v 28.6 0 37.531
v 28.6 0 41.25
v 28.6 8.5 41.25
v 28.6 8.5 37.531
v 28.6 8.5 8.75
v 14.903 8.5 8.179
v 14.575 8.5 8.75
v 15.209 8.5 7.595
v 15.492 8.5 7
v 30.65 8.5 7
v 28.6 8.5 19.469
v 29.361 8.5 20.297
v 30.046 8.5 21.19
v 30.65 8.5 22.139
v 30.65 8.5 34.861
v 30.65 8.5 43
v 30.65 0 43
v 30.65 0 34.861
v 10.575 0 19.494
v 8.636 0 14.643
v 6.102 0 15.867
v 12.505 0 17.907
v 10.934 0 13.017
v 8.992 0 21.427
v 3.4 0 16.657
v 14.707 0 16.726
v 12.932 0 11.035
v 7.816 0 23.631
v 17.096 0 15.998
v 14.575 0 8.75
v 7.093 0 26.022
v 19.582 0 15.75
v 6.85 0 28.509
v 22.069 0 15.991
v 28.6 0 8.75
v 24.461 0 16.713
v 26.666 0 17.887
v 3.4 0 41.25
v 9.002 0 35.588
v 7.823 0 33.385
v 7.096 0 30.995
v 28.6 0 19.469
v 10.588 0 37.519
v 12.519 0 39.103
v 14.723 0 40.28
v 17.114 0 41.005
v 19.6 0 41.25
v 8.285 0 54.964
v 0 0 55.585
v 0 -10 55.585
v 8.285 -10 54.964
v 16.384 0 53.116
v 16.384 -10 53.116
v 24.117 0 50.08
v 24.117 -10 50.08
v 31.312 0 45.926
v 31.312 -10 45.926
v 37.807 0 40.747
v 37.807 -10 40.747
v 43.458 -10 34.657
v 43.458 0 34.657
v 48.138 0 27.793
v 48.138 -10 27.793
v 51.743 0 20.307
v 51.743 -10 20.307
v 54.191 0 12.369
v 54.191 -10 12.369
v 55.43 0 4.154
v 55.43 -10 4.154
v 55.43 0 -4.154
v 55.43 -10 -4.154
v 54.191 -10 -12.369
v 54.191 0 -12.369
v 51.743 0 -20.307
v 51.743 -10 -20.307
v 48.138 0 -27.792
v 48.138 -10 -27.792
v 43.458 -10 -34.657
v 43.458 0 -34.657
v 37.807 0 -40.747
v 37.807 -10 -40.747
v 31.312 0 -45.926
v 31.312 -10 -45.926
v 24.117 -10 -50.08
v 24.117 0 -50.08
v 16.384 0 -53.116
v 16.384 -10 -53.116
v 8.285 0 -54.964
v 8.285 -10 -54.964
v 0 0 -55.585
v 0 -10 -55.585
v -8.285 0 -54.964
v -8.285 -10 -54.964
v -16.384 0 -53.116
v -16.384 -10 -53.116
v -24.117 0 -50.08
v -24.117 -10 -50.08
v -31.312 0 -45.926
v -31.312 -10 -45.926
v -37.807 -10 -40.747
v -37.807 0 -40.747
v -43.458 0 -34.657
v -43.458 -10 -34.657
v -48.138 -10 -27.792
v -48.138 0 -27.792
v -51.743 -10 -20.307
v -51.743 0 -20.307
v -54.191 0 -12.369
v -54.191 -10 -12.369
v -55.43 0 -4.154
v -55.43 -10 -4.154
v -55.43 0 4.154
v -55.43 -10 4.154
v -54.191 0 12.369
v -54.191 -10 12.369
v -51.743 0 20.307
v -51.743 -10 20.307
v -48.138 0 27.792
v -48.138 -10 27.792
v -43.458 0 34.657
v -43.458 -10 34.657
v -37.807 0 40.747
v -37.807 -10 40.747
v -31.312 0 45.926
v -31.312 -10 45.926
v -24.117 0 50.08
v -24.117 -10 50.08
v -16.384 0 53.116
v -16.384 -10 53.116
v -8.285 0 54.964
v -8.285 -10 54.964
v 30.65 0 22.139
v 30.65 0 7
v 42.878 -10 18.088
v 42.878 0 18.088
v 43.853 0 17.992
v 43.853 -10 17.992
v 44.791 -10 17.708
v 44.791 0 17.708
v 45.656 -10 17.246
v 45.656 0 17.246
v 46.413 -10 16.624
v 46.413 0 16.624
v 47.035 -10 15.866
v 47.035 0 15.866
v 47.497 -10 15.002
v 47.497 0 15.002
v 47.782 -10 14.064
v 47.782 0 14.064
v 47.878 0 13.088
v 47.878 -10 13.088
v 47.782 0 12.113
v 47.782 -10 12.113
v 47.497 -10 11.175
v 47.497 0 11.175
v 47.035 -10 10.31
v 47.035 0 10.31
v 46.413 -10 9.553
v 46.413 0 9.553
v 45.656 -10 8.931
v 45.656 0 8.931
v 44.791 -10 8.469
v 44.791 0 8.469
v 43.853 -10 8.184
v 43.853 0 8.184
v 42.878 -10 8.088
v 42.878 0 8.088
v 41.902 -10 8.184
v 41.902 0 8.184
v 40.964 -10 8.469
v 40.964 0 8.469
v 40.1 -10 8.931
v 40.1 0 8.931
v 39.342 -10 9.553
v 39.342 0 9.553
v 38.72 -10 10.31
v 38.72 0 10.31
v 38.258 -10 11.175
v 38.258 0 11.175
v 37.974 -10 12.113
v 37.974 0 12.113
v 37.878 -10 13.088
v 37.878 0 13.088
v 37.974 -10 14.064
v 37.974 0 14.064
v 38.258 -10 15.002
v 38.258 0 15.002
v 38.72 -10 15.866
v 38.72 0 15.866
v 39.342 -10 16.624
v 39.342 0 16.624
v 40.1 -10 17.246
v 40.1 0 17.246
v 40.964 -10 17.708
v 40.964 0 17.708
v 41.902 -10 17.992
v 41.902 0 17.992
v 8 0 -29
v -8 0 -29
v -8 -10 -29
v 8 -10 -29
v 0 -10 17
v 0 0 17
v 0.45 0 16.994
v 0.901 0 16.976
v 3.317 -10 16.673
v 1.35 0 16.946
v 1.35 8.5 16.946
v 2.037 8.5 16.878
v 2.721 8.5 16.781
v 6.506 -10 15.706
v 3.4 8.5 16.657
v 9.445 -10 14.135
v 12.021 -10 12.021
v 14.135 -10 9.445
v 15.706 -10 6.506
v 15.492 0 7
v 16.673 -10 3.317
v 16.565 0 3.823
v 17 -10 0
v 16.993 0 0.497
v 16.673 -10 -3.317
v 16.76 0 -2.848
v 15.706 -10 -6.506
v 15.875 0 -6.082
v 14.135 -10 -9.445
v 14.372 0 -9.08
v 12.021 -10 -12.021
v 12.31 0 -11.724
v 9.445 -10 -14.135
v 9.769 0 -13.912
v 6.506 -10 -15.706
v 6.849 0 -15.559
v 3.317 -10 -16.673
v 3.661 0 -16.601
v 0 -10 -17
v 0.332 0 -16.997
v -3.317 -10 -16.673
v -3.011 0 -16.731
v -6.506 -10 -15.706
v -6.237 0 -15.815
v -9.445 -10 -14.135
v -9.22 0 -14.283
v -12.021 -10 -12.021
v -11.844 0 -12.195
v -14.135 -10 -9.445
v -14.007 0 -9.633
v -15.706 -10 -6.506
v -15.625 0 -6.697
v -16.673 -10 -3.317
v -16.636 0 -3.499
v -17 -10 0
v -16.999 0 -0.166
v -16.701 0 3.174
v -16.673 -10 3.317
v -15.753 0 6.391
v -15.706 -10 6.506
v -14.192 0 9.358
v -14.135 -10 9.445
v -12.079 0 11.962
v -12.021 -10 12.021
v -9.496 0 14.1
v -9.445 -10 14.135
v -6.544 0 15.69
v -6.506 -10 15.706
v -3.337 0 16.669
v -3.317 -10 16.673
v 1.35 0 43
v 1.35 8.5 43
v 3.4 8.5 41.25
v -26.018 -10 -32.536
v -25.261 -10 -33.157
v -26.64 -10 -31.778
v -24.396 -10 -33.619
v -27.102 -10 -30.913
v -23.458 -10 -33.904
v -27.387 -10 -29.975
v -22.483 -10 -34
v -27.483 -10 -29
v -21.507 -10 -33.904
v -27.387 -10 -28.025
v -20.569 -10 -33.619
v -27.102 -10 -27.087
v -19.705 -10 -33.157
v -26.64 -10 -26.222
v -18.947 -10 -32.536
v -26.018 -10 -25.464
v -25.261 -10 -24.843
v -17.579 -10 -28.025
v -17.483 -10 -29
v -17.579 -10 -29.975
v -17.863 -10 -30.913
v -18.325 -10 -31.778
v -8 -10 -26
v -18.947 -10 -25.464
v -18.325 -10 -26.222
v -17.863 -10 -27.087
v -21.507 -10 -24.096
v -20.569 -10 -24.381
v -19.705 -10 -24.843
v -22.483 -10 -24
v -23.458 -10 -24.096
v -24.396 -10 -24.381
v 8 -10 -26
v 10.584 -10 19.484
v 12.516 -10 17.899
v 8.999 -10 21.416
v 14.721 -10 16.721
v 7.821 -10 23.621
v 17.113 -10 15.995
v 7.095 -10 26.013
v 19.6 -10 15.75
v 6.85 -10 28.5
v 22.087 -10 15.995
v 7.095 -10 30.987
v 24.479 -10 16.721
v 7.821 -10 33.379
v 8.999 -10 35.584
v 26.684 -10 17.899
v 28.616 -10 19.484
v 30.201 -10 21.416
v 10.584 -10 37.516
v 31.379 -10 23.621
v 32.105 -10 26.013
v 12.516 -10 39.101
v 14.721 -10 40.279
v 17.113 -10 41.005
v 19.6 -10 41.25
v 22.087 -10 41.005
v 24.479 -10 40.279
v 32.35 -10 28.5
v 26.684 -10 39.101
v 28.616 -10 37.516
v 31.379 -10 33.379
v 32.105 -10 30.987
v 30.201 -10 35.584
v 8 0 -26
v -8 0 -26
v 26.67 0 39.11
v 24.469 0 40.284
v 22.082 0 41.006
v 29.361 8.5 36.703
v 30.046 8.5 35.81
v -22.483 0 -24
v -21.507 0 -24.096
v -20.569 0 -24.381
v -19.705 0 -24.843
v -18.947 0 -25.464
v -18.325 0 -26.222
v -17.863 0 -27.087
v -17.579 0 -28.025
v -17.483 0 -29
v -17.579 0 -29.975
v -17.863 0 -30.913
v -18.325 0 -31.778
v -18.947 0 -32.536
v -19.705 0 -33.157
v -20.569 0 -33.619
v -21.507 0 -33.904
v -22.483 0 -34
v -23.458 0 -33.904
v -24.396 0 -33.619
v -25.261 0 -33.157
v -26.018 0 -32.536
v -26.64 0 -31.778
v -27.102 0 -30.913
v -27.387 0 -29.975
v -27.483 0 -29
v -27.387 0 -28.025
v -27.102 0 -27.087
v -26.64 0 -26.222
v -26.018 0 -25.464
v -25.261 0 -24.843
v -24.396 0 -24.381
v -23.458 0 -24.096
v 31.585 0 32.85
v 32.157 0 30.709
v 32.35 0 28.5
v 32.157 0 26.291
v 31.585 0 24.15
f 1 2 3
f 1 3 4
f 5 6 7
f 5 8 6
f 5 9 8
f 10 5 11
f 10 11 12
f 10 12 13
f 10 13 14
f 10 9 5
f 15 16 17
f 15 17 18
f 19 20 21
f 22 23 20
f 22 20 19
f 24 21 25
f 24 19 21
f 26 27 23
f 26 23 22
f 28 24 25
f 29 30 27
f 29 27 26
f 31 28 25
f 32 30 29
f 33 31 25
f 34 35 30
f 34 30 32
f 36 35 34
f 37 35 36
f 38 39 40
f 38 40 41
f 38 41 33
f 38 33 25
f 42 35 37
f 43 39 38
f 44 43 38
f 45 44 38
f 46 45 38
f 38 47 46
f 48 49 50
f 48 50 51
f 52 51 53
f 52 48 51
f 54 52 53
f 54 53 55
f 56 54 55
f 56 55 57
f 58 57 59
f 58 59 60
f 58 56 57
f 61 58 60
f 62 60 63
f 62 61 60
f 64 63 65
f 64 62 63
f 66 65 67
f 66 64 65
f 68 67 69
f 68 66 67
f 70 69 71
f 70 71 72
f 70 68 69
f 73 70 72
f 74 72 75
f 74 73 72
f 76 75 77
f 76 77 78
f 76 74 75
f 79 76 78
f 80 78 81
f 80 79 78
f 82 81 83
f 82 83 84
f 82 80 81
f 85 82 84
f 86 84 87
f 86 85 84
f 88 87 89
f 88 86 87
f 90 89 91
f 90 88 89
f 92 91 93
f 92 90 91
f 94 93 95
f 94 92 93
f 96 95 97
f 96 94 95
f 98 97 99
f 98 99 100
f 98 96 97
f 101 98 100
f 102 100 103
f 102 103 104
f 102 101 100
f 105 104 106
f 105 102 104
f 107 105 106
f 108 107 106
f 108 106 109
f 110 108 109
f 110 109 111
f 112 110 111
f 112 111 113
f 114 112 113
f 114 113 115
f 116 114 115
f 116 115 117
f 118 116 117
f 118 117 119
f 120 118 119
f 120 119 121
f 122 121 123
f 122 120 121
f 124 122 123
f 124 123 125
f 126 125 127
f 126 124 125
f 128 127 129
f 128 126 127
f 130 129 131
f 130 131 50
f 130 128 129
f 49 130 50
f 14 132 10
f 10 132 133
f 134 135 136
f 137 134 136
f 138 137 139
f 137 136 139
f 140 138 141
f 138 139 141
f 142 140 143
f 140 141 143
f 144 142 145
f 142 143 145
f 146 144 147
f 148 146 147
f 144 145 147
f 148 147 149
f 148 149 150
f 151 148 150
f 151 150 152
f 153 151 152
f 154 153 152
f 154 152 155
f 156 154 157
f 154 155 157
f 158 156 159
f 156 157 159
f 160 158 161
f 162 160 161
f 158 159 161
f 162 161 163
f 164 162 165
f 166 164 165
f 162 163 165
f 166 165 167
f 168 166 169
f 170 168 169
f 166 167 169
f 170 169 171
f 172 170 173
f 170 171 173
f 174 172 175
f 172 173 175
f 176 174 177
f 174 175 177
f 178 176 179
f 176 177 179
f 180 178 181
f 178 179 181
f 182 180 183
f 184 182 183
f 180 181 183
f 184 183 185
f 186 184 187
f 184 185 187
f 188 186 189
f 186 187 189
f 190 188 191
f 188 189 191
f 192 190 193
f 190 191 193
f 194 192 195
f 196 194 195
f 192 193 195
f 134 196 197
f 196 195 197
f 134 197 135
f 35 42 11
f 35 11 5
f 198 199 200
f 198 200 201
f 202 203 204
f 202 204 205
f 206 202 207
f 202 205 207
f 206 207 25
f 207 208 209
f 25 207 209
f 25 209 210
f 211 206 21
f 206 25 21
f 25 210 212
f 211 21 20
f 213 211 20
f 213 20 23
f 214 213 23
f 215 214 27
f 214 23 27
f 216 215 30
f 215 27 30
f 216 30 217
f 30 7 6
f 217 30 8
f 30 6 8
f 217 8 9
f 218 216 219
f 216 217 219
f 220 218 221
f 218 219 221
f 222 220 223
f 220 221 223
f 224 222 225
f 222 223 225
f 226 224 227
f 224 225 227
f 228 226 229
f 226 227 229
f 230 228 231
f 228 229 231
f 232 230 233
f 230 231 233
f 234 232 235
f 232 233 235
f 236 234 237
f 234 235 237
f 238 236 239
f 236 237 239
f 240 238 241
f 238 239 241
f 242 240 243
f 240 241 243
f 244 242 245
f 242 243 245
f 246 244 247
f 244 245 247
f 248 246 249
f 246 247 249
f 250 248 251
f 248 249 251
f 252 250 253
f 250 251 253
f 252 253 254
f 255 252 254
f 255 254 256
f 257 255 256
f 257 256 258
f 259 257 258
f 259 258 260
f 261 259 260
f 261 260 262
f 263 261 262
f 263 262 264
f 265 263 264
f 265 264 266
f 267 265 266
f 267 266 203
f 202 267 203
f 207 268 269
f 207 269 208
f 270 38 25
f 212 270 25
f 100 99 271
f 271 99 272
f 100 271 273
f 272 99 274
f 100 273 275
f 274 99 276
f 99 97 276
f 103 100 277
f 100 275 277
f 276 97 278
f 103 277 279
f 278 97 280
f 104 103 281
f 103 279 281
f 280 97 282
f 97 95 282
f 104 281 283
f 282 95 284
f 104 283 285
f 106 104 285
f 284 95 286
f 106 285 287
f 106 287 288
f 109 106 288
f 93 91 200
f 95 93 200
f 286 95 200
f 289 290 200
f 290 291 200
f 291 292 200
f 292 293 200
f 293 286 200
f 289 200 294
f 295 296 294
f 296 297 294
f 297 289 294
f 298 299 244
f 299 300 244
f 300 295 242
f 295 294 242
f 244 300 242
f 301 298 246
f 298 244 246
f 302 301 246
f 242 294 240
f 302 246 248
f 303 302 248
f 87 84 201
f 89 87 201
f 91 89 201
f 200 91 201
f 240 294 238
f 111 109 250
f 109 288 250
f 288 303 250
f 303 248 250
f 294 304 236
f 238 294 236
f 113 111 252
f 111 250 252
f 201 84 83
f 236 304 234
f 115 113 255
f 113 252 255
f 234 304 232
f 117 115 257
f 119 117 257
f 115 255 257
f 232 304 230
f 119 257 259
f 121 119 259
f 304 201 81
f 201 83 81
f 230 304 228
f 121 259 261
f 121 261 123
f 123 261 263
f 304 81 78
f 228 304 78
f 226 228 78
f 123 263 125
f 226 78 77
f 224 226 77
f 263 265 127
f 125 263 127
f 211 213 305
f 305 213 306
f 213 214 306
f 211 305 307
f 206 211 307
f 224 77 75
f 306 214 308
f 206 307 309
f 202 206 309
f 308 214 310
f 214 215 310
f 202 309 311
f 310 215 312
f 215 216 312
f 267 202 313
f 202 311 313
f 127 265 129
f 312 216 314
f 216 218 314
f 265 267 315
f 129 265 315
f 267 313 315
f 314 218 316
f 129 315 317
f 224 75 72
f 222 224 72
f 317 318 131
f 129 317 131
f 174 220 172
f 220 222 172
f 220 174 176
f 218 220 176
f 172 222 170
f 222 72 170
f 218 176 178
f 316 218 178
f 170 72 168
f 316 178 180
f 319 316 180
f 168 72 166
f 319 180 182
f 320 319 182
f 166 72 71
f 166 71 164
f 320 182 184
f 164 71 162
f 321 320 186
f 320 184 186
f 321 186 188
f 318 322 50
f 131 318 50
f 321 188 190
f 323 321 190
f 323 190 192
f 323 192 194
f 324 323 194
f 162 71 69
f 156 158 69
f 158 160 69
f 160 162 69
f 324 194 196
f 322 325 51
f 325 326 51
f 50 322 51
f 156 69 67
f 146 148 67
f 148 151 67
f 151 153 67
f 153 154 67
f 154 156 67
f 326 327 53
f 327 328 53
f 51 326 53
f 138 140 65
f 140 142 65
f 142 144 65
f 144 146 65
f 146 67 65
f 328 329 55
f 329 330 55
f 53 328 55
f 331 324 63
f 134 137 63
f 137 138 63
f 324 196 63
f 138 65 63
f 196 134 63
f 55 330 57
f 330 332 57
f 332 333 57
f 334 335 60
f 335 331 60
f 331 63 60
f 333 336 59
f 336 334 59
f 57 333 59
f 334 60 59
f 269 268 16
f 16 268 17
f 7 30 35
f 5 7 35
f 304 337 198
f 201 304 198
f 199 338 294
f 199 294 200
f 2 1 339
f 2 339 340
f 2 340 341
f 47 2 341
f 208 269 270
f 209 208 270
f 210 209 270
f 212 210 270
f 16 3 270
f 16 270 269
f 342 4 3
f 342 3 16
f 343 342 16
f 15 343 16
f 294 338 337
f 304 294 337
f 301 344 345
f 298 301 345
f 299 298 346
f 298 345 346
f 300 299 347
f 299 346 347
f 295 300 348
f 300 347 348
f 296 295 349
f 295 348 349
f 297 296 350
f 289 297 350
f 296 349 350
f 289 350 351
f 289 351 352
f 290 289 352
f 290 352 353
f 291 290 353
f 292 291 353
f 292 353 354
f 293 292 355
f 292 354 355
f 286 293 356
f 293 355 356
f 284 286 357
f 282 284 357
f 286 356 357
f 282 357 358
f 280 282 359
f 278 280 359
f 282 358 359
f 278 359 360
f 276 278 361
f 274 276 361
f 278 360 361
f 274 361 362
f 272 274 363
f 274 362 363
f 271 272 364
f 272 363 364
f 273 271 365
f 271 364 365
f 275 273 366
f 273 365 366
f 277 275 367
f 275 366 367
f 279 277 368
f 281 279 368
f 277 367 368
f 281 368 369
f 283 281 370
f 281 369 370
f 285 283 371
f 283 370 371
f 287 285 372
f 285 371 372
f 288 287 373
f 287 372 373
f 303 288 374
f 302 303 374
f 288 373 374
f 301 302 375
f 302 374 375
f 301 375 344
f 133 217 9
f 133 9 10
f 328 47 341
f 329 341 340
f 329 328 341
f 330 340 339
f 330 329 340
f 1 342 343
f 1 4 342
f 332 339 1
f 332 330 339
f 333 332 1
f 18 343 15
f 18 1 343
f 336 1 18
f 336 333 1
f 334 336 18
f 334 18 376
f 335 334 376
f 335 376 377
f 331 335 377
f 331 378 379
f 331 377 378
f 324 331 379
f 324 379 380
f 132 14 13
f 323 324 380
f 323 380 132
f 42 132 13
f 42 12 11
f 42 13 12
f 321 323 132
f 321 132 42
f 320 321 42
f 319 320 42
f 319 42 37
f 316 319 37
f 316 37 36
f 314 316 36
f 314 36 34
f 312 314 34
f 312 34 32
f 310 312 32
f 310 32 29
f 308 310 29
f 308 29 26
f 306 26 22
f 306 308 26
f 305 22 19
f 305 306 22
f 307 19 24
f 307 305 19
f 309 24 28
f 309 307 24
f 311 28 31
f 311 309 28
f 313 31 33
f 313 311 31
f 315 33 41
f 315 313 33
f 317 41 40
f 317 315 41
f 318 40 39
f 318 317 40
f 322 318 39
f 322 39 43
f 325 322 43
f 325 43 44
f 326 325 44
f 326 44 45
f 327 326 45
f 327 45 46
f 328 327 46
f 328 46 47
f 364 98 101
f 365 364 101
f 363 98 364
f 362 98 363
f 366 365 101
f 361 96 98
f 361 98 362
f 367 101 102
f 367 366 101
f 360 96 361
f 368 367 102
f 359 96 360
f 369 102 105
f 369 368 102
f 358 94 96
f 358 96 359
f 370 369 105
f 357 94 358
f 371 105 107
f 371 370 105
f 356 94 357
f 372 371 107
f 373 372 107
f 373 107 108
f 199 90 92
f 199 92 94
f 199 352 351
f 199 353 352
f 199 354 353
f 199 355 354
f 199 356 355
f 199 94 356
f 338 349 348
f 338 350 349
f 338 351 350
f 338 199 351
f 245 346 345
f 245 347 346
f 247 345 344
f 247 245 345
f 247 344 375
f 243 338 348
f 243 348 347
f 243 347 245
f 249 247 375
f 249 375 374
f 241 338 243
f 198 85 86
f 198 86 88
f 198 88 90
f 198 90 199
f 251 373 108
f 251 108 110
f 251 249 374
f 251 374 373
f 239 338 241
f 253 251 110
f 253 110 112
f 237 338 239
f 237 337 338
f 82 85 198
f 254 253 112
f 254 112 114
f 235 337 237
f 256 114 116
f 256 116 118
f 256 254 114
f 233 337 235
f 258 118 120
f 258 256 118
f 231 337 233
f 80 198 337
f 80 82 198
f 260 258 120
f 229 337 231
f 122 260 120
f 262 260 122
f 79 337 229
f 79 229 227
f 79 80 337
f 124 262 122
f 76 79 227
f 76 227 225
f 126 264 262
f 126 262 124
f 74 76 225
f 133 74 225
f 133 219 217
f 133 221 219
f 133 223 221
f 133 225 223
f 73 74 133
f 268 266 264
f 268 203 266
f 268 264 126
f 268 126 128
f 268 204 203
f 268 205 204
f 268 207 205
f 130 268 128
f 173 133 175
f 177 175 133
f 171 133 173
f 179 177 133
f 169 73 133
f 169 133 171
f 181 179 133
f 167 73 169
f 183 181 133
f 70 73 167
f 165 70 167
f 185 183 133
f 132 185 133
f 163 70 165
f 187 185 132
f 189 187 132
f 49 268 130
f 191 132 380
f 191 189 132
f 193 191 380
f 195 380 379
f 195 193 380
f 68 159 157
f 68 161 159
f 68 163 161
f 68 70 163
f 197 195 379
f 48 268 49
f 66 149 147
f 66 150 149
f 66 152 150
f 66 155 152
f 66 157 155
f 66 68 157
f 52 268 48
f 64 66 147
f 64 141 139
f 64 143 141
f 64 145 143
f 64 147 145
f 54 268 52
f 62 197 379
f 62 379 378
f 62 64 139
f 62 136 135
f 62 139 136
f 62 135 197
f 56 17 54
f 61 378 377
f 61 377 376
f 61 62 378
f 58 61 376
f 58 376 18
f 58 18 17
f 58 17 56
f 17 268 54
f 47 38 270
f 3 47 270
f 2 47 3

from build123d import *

# Parameters (mm, degrees)
SKETCH1_R               = 55.585
SKETCH1_R_2             = 17
BOSS_EXTRUDE1_DEPTH     = 10
SKETCH2_W               = 29.3
SKETCH2_H               = 36
SKETCH2_W_2             = 25.2
SKETCH2_H_2             = 32.5
BOSS_EXTRUDE2_DEPTH     = 8.5
CUT_EXTRUDE1_DEPTH      = 10
CUT_EXTRUDE1_DEPTH_BACK = 10
SKETCH4_R               = 12.75
CUT_EXTRUDE2_START      = 10
SKETCH5_R               = 17
CUT_EXTRUDE2_DEPTH      = 10
SKETCH6_R               = 5
CUT_EXTRUDE3_DEPTH      = 10
SKETCH8_R               = 5
SKETCH8_W               = 16
SKETCH8_H               = 3
CUT_EXTRUDE4_DEPTH      = 10


with BuildPart() as part:
    # Sketch1 → Boss-Extrude1 (new body)
    with BuildSketch(Plane(origin=(0, 0, 0), x_dir=(1, 0, 0), z_dir=(0, 1, 0))):
        with Locations(Location((0, 0, 0), (0, 0, 270))):
            Circle(SKETCH1_R)
        with Locations(Location((0, 0, 0), (0, 0, 270))):
            Circle(SKETCH1_R_2, mode=Mode.SUBTRACT)
    extrude(amount=-BOSS_EXTRUDE1_DEPTH)

    # Sketch2 → Boss-Extrude2 (add)
    with BuildSketch(Plane(origin=(0, 0, 0), x_dir=(1, 0, 0), z_dir=(0, 1, 0))):
        with Locations((16, -25)):
            Rectangle(SKETCH2_W, SKETCH2_H)
        with Locations((16, -25)):
            Rectangle(SKETCH2_W_2, SKETCH2_H_2, mode=Mode.SUBTRACT)
    extrude(amount=BOSS_EXTRUDE2_DEPTH)

    # Sketch4 → Cut-Extrude1 (cut, two sides: drawn at the far end of the back side and taken through both)
    with BuildSketch(Plane(origin=(0, 0, 0), x_dir=(1, 0, 0), z_dir=(0, 1, 0)).offset(-CUT_EXTRUDE1_DEPTH_BACK)):
        with Locations(Location((19.6, -28.5, 0), (0, 0, 270))):
            Circle(SKETCH4_R)
    extrude(amount=CUT_EXTRUDE1_DEPTH + CUT_EXTRUDE1_DEPTH_BACK, mode=Mode.SUBTRACT)

    # Sketch5 → Cut-Extrude2 (cut)
    with BuildSketch(Plane(origin=(0, 0, 0), x_dir=(1, 0, 0), z_dir=(0, 1, 0)).offset(CUT_EXTRUDE2_START)):
        with Locations(Location((0, 0, 0), (0, 0, 270))):
            Circle(SKETCH5_R)
    extrude(amount=-CUT_EXTRUDE2_DEPTH, mode=Mode.SUBTRACT)

    # Sketch6 → Cut-Extrude3 (cut)
    with BuildSketch(Plane(origin=(0, 0, 0), x_dir=(1, 0, 0), z_dir=(0, 1, 0))):
        with Locations(Location((42.877793379, -13.088165395, 0), (0, 0, 270))):
            Circle(SKETCH6_R)
    extrude(amount=-CUT_EXTRUDE3_DEPTH, mode=Mode.SUBTRACT)

    # Sketch8 → Cut-Extrude4 (cut)
    with BuildSketch(Plane(origin=(0, 0, 0), x_dir=(1, 0, 0), z_dir=(0, 1, 0))):
        with Locations(Location((-22.482738101, 29, 0), (0, 0, 270))):
            Circle(SKETCH8_R)
        with Locations((0, 27.5)):
            Rectangle(SKETCH8_W, SKETCH8_H)
    extrude(amount=-CUT_EXTRUDE4_DEPTH, mode=Mode.SUBTRACT)


solid = part.part
